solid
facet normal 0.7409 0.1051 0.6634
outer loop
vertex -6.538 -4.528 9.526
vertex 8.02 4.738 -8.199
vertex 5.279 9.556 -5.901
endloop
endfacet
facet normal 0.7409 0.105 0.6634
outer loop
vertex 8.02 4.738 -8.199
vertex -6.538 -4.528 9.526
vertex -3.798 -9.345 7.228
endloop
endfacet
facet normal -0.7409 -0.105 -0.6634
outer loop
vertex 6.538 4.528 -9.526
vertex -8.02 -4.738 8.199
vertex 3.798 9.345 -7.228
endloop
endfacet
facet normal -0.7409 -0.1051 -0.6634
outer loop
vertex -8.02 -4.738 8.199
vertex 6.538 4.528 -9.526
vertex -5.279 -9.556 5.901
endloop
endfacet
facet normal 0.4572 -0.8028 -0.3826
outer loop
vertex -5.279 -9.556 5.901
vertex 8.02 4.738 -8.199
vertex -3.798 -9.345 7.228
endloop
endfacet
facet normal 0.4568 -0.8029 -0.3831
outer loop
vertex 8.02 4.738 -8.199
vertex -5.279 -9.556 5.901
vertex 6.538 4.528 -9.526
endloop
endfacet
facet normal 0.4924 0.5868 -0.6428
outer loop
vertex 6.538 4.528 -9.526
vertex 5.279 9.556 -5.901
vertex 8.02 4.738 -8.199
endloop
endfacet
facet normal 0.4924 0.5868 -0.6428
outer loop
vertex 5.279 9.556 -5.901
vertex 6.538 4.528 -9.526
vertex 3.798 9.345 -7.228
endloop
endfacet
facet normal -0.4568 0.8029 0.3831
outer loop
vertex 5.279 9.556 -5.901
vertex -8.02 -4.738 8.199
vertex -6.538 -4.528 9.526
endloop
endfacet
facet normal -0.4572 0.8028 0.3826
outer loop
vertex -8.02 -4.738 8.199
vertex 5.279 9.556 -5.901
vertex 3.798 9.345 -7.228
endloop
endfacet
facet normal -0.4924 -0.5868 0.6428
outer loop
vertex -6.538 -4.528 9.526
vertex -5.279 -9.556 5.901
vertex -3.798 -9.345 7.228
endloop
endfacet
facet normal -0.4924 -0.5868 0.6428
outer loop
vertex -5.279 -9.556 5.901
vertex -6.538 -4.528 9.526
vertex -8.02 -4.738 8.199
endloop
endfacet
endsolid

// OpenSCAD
// Multi-axis rotate Euler-ORDER check. OpenSCAD applies rotations as Rz·Ry·Rx (X first, then Y,
// then Z). A strongly asymmetric bar makes the composed orientation unambiguous: if gcad's Euler
// order/convention differs from OpenSCAD, the bar points the wrong way against the reference.
rotate([30, 40, 50]) cube([24, 6, 2], center = true);
